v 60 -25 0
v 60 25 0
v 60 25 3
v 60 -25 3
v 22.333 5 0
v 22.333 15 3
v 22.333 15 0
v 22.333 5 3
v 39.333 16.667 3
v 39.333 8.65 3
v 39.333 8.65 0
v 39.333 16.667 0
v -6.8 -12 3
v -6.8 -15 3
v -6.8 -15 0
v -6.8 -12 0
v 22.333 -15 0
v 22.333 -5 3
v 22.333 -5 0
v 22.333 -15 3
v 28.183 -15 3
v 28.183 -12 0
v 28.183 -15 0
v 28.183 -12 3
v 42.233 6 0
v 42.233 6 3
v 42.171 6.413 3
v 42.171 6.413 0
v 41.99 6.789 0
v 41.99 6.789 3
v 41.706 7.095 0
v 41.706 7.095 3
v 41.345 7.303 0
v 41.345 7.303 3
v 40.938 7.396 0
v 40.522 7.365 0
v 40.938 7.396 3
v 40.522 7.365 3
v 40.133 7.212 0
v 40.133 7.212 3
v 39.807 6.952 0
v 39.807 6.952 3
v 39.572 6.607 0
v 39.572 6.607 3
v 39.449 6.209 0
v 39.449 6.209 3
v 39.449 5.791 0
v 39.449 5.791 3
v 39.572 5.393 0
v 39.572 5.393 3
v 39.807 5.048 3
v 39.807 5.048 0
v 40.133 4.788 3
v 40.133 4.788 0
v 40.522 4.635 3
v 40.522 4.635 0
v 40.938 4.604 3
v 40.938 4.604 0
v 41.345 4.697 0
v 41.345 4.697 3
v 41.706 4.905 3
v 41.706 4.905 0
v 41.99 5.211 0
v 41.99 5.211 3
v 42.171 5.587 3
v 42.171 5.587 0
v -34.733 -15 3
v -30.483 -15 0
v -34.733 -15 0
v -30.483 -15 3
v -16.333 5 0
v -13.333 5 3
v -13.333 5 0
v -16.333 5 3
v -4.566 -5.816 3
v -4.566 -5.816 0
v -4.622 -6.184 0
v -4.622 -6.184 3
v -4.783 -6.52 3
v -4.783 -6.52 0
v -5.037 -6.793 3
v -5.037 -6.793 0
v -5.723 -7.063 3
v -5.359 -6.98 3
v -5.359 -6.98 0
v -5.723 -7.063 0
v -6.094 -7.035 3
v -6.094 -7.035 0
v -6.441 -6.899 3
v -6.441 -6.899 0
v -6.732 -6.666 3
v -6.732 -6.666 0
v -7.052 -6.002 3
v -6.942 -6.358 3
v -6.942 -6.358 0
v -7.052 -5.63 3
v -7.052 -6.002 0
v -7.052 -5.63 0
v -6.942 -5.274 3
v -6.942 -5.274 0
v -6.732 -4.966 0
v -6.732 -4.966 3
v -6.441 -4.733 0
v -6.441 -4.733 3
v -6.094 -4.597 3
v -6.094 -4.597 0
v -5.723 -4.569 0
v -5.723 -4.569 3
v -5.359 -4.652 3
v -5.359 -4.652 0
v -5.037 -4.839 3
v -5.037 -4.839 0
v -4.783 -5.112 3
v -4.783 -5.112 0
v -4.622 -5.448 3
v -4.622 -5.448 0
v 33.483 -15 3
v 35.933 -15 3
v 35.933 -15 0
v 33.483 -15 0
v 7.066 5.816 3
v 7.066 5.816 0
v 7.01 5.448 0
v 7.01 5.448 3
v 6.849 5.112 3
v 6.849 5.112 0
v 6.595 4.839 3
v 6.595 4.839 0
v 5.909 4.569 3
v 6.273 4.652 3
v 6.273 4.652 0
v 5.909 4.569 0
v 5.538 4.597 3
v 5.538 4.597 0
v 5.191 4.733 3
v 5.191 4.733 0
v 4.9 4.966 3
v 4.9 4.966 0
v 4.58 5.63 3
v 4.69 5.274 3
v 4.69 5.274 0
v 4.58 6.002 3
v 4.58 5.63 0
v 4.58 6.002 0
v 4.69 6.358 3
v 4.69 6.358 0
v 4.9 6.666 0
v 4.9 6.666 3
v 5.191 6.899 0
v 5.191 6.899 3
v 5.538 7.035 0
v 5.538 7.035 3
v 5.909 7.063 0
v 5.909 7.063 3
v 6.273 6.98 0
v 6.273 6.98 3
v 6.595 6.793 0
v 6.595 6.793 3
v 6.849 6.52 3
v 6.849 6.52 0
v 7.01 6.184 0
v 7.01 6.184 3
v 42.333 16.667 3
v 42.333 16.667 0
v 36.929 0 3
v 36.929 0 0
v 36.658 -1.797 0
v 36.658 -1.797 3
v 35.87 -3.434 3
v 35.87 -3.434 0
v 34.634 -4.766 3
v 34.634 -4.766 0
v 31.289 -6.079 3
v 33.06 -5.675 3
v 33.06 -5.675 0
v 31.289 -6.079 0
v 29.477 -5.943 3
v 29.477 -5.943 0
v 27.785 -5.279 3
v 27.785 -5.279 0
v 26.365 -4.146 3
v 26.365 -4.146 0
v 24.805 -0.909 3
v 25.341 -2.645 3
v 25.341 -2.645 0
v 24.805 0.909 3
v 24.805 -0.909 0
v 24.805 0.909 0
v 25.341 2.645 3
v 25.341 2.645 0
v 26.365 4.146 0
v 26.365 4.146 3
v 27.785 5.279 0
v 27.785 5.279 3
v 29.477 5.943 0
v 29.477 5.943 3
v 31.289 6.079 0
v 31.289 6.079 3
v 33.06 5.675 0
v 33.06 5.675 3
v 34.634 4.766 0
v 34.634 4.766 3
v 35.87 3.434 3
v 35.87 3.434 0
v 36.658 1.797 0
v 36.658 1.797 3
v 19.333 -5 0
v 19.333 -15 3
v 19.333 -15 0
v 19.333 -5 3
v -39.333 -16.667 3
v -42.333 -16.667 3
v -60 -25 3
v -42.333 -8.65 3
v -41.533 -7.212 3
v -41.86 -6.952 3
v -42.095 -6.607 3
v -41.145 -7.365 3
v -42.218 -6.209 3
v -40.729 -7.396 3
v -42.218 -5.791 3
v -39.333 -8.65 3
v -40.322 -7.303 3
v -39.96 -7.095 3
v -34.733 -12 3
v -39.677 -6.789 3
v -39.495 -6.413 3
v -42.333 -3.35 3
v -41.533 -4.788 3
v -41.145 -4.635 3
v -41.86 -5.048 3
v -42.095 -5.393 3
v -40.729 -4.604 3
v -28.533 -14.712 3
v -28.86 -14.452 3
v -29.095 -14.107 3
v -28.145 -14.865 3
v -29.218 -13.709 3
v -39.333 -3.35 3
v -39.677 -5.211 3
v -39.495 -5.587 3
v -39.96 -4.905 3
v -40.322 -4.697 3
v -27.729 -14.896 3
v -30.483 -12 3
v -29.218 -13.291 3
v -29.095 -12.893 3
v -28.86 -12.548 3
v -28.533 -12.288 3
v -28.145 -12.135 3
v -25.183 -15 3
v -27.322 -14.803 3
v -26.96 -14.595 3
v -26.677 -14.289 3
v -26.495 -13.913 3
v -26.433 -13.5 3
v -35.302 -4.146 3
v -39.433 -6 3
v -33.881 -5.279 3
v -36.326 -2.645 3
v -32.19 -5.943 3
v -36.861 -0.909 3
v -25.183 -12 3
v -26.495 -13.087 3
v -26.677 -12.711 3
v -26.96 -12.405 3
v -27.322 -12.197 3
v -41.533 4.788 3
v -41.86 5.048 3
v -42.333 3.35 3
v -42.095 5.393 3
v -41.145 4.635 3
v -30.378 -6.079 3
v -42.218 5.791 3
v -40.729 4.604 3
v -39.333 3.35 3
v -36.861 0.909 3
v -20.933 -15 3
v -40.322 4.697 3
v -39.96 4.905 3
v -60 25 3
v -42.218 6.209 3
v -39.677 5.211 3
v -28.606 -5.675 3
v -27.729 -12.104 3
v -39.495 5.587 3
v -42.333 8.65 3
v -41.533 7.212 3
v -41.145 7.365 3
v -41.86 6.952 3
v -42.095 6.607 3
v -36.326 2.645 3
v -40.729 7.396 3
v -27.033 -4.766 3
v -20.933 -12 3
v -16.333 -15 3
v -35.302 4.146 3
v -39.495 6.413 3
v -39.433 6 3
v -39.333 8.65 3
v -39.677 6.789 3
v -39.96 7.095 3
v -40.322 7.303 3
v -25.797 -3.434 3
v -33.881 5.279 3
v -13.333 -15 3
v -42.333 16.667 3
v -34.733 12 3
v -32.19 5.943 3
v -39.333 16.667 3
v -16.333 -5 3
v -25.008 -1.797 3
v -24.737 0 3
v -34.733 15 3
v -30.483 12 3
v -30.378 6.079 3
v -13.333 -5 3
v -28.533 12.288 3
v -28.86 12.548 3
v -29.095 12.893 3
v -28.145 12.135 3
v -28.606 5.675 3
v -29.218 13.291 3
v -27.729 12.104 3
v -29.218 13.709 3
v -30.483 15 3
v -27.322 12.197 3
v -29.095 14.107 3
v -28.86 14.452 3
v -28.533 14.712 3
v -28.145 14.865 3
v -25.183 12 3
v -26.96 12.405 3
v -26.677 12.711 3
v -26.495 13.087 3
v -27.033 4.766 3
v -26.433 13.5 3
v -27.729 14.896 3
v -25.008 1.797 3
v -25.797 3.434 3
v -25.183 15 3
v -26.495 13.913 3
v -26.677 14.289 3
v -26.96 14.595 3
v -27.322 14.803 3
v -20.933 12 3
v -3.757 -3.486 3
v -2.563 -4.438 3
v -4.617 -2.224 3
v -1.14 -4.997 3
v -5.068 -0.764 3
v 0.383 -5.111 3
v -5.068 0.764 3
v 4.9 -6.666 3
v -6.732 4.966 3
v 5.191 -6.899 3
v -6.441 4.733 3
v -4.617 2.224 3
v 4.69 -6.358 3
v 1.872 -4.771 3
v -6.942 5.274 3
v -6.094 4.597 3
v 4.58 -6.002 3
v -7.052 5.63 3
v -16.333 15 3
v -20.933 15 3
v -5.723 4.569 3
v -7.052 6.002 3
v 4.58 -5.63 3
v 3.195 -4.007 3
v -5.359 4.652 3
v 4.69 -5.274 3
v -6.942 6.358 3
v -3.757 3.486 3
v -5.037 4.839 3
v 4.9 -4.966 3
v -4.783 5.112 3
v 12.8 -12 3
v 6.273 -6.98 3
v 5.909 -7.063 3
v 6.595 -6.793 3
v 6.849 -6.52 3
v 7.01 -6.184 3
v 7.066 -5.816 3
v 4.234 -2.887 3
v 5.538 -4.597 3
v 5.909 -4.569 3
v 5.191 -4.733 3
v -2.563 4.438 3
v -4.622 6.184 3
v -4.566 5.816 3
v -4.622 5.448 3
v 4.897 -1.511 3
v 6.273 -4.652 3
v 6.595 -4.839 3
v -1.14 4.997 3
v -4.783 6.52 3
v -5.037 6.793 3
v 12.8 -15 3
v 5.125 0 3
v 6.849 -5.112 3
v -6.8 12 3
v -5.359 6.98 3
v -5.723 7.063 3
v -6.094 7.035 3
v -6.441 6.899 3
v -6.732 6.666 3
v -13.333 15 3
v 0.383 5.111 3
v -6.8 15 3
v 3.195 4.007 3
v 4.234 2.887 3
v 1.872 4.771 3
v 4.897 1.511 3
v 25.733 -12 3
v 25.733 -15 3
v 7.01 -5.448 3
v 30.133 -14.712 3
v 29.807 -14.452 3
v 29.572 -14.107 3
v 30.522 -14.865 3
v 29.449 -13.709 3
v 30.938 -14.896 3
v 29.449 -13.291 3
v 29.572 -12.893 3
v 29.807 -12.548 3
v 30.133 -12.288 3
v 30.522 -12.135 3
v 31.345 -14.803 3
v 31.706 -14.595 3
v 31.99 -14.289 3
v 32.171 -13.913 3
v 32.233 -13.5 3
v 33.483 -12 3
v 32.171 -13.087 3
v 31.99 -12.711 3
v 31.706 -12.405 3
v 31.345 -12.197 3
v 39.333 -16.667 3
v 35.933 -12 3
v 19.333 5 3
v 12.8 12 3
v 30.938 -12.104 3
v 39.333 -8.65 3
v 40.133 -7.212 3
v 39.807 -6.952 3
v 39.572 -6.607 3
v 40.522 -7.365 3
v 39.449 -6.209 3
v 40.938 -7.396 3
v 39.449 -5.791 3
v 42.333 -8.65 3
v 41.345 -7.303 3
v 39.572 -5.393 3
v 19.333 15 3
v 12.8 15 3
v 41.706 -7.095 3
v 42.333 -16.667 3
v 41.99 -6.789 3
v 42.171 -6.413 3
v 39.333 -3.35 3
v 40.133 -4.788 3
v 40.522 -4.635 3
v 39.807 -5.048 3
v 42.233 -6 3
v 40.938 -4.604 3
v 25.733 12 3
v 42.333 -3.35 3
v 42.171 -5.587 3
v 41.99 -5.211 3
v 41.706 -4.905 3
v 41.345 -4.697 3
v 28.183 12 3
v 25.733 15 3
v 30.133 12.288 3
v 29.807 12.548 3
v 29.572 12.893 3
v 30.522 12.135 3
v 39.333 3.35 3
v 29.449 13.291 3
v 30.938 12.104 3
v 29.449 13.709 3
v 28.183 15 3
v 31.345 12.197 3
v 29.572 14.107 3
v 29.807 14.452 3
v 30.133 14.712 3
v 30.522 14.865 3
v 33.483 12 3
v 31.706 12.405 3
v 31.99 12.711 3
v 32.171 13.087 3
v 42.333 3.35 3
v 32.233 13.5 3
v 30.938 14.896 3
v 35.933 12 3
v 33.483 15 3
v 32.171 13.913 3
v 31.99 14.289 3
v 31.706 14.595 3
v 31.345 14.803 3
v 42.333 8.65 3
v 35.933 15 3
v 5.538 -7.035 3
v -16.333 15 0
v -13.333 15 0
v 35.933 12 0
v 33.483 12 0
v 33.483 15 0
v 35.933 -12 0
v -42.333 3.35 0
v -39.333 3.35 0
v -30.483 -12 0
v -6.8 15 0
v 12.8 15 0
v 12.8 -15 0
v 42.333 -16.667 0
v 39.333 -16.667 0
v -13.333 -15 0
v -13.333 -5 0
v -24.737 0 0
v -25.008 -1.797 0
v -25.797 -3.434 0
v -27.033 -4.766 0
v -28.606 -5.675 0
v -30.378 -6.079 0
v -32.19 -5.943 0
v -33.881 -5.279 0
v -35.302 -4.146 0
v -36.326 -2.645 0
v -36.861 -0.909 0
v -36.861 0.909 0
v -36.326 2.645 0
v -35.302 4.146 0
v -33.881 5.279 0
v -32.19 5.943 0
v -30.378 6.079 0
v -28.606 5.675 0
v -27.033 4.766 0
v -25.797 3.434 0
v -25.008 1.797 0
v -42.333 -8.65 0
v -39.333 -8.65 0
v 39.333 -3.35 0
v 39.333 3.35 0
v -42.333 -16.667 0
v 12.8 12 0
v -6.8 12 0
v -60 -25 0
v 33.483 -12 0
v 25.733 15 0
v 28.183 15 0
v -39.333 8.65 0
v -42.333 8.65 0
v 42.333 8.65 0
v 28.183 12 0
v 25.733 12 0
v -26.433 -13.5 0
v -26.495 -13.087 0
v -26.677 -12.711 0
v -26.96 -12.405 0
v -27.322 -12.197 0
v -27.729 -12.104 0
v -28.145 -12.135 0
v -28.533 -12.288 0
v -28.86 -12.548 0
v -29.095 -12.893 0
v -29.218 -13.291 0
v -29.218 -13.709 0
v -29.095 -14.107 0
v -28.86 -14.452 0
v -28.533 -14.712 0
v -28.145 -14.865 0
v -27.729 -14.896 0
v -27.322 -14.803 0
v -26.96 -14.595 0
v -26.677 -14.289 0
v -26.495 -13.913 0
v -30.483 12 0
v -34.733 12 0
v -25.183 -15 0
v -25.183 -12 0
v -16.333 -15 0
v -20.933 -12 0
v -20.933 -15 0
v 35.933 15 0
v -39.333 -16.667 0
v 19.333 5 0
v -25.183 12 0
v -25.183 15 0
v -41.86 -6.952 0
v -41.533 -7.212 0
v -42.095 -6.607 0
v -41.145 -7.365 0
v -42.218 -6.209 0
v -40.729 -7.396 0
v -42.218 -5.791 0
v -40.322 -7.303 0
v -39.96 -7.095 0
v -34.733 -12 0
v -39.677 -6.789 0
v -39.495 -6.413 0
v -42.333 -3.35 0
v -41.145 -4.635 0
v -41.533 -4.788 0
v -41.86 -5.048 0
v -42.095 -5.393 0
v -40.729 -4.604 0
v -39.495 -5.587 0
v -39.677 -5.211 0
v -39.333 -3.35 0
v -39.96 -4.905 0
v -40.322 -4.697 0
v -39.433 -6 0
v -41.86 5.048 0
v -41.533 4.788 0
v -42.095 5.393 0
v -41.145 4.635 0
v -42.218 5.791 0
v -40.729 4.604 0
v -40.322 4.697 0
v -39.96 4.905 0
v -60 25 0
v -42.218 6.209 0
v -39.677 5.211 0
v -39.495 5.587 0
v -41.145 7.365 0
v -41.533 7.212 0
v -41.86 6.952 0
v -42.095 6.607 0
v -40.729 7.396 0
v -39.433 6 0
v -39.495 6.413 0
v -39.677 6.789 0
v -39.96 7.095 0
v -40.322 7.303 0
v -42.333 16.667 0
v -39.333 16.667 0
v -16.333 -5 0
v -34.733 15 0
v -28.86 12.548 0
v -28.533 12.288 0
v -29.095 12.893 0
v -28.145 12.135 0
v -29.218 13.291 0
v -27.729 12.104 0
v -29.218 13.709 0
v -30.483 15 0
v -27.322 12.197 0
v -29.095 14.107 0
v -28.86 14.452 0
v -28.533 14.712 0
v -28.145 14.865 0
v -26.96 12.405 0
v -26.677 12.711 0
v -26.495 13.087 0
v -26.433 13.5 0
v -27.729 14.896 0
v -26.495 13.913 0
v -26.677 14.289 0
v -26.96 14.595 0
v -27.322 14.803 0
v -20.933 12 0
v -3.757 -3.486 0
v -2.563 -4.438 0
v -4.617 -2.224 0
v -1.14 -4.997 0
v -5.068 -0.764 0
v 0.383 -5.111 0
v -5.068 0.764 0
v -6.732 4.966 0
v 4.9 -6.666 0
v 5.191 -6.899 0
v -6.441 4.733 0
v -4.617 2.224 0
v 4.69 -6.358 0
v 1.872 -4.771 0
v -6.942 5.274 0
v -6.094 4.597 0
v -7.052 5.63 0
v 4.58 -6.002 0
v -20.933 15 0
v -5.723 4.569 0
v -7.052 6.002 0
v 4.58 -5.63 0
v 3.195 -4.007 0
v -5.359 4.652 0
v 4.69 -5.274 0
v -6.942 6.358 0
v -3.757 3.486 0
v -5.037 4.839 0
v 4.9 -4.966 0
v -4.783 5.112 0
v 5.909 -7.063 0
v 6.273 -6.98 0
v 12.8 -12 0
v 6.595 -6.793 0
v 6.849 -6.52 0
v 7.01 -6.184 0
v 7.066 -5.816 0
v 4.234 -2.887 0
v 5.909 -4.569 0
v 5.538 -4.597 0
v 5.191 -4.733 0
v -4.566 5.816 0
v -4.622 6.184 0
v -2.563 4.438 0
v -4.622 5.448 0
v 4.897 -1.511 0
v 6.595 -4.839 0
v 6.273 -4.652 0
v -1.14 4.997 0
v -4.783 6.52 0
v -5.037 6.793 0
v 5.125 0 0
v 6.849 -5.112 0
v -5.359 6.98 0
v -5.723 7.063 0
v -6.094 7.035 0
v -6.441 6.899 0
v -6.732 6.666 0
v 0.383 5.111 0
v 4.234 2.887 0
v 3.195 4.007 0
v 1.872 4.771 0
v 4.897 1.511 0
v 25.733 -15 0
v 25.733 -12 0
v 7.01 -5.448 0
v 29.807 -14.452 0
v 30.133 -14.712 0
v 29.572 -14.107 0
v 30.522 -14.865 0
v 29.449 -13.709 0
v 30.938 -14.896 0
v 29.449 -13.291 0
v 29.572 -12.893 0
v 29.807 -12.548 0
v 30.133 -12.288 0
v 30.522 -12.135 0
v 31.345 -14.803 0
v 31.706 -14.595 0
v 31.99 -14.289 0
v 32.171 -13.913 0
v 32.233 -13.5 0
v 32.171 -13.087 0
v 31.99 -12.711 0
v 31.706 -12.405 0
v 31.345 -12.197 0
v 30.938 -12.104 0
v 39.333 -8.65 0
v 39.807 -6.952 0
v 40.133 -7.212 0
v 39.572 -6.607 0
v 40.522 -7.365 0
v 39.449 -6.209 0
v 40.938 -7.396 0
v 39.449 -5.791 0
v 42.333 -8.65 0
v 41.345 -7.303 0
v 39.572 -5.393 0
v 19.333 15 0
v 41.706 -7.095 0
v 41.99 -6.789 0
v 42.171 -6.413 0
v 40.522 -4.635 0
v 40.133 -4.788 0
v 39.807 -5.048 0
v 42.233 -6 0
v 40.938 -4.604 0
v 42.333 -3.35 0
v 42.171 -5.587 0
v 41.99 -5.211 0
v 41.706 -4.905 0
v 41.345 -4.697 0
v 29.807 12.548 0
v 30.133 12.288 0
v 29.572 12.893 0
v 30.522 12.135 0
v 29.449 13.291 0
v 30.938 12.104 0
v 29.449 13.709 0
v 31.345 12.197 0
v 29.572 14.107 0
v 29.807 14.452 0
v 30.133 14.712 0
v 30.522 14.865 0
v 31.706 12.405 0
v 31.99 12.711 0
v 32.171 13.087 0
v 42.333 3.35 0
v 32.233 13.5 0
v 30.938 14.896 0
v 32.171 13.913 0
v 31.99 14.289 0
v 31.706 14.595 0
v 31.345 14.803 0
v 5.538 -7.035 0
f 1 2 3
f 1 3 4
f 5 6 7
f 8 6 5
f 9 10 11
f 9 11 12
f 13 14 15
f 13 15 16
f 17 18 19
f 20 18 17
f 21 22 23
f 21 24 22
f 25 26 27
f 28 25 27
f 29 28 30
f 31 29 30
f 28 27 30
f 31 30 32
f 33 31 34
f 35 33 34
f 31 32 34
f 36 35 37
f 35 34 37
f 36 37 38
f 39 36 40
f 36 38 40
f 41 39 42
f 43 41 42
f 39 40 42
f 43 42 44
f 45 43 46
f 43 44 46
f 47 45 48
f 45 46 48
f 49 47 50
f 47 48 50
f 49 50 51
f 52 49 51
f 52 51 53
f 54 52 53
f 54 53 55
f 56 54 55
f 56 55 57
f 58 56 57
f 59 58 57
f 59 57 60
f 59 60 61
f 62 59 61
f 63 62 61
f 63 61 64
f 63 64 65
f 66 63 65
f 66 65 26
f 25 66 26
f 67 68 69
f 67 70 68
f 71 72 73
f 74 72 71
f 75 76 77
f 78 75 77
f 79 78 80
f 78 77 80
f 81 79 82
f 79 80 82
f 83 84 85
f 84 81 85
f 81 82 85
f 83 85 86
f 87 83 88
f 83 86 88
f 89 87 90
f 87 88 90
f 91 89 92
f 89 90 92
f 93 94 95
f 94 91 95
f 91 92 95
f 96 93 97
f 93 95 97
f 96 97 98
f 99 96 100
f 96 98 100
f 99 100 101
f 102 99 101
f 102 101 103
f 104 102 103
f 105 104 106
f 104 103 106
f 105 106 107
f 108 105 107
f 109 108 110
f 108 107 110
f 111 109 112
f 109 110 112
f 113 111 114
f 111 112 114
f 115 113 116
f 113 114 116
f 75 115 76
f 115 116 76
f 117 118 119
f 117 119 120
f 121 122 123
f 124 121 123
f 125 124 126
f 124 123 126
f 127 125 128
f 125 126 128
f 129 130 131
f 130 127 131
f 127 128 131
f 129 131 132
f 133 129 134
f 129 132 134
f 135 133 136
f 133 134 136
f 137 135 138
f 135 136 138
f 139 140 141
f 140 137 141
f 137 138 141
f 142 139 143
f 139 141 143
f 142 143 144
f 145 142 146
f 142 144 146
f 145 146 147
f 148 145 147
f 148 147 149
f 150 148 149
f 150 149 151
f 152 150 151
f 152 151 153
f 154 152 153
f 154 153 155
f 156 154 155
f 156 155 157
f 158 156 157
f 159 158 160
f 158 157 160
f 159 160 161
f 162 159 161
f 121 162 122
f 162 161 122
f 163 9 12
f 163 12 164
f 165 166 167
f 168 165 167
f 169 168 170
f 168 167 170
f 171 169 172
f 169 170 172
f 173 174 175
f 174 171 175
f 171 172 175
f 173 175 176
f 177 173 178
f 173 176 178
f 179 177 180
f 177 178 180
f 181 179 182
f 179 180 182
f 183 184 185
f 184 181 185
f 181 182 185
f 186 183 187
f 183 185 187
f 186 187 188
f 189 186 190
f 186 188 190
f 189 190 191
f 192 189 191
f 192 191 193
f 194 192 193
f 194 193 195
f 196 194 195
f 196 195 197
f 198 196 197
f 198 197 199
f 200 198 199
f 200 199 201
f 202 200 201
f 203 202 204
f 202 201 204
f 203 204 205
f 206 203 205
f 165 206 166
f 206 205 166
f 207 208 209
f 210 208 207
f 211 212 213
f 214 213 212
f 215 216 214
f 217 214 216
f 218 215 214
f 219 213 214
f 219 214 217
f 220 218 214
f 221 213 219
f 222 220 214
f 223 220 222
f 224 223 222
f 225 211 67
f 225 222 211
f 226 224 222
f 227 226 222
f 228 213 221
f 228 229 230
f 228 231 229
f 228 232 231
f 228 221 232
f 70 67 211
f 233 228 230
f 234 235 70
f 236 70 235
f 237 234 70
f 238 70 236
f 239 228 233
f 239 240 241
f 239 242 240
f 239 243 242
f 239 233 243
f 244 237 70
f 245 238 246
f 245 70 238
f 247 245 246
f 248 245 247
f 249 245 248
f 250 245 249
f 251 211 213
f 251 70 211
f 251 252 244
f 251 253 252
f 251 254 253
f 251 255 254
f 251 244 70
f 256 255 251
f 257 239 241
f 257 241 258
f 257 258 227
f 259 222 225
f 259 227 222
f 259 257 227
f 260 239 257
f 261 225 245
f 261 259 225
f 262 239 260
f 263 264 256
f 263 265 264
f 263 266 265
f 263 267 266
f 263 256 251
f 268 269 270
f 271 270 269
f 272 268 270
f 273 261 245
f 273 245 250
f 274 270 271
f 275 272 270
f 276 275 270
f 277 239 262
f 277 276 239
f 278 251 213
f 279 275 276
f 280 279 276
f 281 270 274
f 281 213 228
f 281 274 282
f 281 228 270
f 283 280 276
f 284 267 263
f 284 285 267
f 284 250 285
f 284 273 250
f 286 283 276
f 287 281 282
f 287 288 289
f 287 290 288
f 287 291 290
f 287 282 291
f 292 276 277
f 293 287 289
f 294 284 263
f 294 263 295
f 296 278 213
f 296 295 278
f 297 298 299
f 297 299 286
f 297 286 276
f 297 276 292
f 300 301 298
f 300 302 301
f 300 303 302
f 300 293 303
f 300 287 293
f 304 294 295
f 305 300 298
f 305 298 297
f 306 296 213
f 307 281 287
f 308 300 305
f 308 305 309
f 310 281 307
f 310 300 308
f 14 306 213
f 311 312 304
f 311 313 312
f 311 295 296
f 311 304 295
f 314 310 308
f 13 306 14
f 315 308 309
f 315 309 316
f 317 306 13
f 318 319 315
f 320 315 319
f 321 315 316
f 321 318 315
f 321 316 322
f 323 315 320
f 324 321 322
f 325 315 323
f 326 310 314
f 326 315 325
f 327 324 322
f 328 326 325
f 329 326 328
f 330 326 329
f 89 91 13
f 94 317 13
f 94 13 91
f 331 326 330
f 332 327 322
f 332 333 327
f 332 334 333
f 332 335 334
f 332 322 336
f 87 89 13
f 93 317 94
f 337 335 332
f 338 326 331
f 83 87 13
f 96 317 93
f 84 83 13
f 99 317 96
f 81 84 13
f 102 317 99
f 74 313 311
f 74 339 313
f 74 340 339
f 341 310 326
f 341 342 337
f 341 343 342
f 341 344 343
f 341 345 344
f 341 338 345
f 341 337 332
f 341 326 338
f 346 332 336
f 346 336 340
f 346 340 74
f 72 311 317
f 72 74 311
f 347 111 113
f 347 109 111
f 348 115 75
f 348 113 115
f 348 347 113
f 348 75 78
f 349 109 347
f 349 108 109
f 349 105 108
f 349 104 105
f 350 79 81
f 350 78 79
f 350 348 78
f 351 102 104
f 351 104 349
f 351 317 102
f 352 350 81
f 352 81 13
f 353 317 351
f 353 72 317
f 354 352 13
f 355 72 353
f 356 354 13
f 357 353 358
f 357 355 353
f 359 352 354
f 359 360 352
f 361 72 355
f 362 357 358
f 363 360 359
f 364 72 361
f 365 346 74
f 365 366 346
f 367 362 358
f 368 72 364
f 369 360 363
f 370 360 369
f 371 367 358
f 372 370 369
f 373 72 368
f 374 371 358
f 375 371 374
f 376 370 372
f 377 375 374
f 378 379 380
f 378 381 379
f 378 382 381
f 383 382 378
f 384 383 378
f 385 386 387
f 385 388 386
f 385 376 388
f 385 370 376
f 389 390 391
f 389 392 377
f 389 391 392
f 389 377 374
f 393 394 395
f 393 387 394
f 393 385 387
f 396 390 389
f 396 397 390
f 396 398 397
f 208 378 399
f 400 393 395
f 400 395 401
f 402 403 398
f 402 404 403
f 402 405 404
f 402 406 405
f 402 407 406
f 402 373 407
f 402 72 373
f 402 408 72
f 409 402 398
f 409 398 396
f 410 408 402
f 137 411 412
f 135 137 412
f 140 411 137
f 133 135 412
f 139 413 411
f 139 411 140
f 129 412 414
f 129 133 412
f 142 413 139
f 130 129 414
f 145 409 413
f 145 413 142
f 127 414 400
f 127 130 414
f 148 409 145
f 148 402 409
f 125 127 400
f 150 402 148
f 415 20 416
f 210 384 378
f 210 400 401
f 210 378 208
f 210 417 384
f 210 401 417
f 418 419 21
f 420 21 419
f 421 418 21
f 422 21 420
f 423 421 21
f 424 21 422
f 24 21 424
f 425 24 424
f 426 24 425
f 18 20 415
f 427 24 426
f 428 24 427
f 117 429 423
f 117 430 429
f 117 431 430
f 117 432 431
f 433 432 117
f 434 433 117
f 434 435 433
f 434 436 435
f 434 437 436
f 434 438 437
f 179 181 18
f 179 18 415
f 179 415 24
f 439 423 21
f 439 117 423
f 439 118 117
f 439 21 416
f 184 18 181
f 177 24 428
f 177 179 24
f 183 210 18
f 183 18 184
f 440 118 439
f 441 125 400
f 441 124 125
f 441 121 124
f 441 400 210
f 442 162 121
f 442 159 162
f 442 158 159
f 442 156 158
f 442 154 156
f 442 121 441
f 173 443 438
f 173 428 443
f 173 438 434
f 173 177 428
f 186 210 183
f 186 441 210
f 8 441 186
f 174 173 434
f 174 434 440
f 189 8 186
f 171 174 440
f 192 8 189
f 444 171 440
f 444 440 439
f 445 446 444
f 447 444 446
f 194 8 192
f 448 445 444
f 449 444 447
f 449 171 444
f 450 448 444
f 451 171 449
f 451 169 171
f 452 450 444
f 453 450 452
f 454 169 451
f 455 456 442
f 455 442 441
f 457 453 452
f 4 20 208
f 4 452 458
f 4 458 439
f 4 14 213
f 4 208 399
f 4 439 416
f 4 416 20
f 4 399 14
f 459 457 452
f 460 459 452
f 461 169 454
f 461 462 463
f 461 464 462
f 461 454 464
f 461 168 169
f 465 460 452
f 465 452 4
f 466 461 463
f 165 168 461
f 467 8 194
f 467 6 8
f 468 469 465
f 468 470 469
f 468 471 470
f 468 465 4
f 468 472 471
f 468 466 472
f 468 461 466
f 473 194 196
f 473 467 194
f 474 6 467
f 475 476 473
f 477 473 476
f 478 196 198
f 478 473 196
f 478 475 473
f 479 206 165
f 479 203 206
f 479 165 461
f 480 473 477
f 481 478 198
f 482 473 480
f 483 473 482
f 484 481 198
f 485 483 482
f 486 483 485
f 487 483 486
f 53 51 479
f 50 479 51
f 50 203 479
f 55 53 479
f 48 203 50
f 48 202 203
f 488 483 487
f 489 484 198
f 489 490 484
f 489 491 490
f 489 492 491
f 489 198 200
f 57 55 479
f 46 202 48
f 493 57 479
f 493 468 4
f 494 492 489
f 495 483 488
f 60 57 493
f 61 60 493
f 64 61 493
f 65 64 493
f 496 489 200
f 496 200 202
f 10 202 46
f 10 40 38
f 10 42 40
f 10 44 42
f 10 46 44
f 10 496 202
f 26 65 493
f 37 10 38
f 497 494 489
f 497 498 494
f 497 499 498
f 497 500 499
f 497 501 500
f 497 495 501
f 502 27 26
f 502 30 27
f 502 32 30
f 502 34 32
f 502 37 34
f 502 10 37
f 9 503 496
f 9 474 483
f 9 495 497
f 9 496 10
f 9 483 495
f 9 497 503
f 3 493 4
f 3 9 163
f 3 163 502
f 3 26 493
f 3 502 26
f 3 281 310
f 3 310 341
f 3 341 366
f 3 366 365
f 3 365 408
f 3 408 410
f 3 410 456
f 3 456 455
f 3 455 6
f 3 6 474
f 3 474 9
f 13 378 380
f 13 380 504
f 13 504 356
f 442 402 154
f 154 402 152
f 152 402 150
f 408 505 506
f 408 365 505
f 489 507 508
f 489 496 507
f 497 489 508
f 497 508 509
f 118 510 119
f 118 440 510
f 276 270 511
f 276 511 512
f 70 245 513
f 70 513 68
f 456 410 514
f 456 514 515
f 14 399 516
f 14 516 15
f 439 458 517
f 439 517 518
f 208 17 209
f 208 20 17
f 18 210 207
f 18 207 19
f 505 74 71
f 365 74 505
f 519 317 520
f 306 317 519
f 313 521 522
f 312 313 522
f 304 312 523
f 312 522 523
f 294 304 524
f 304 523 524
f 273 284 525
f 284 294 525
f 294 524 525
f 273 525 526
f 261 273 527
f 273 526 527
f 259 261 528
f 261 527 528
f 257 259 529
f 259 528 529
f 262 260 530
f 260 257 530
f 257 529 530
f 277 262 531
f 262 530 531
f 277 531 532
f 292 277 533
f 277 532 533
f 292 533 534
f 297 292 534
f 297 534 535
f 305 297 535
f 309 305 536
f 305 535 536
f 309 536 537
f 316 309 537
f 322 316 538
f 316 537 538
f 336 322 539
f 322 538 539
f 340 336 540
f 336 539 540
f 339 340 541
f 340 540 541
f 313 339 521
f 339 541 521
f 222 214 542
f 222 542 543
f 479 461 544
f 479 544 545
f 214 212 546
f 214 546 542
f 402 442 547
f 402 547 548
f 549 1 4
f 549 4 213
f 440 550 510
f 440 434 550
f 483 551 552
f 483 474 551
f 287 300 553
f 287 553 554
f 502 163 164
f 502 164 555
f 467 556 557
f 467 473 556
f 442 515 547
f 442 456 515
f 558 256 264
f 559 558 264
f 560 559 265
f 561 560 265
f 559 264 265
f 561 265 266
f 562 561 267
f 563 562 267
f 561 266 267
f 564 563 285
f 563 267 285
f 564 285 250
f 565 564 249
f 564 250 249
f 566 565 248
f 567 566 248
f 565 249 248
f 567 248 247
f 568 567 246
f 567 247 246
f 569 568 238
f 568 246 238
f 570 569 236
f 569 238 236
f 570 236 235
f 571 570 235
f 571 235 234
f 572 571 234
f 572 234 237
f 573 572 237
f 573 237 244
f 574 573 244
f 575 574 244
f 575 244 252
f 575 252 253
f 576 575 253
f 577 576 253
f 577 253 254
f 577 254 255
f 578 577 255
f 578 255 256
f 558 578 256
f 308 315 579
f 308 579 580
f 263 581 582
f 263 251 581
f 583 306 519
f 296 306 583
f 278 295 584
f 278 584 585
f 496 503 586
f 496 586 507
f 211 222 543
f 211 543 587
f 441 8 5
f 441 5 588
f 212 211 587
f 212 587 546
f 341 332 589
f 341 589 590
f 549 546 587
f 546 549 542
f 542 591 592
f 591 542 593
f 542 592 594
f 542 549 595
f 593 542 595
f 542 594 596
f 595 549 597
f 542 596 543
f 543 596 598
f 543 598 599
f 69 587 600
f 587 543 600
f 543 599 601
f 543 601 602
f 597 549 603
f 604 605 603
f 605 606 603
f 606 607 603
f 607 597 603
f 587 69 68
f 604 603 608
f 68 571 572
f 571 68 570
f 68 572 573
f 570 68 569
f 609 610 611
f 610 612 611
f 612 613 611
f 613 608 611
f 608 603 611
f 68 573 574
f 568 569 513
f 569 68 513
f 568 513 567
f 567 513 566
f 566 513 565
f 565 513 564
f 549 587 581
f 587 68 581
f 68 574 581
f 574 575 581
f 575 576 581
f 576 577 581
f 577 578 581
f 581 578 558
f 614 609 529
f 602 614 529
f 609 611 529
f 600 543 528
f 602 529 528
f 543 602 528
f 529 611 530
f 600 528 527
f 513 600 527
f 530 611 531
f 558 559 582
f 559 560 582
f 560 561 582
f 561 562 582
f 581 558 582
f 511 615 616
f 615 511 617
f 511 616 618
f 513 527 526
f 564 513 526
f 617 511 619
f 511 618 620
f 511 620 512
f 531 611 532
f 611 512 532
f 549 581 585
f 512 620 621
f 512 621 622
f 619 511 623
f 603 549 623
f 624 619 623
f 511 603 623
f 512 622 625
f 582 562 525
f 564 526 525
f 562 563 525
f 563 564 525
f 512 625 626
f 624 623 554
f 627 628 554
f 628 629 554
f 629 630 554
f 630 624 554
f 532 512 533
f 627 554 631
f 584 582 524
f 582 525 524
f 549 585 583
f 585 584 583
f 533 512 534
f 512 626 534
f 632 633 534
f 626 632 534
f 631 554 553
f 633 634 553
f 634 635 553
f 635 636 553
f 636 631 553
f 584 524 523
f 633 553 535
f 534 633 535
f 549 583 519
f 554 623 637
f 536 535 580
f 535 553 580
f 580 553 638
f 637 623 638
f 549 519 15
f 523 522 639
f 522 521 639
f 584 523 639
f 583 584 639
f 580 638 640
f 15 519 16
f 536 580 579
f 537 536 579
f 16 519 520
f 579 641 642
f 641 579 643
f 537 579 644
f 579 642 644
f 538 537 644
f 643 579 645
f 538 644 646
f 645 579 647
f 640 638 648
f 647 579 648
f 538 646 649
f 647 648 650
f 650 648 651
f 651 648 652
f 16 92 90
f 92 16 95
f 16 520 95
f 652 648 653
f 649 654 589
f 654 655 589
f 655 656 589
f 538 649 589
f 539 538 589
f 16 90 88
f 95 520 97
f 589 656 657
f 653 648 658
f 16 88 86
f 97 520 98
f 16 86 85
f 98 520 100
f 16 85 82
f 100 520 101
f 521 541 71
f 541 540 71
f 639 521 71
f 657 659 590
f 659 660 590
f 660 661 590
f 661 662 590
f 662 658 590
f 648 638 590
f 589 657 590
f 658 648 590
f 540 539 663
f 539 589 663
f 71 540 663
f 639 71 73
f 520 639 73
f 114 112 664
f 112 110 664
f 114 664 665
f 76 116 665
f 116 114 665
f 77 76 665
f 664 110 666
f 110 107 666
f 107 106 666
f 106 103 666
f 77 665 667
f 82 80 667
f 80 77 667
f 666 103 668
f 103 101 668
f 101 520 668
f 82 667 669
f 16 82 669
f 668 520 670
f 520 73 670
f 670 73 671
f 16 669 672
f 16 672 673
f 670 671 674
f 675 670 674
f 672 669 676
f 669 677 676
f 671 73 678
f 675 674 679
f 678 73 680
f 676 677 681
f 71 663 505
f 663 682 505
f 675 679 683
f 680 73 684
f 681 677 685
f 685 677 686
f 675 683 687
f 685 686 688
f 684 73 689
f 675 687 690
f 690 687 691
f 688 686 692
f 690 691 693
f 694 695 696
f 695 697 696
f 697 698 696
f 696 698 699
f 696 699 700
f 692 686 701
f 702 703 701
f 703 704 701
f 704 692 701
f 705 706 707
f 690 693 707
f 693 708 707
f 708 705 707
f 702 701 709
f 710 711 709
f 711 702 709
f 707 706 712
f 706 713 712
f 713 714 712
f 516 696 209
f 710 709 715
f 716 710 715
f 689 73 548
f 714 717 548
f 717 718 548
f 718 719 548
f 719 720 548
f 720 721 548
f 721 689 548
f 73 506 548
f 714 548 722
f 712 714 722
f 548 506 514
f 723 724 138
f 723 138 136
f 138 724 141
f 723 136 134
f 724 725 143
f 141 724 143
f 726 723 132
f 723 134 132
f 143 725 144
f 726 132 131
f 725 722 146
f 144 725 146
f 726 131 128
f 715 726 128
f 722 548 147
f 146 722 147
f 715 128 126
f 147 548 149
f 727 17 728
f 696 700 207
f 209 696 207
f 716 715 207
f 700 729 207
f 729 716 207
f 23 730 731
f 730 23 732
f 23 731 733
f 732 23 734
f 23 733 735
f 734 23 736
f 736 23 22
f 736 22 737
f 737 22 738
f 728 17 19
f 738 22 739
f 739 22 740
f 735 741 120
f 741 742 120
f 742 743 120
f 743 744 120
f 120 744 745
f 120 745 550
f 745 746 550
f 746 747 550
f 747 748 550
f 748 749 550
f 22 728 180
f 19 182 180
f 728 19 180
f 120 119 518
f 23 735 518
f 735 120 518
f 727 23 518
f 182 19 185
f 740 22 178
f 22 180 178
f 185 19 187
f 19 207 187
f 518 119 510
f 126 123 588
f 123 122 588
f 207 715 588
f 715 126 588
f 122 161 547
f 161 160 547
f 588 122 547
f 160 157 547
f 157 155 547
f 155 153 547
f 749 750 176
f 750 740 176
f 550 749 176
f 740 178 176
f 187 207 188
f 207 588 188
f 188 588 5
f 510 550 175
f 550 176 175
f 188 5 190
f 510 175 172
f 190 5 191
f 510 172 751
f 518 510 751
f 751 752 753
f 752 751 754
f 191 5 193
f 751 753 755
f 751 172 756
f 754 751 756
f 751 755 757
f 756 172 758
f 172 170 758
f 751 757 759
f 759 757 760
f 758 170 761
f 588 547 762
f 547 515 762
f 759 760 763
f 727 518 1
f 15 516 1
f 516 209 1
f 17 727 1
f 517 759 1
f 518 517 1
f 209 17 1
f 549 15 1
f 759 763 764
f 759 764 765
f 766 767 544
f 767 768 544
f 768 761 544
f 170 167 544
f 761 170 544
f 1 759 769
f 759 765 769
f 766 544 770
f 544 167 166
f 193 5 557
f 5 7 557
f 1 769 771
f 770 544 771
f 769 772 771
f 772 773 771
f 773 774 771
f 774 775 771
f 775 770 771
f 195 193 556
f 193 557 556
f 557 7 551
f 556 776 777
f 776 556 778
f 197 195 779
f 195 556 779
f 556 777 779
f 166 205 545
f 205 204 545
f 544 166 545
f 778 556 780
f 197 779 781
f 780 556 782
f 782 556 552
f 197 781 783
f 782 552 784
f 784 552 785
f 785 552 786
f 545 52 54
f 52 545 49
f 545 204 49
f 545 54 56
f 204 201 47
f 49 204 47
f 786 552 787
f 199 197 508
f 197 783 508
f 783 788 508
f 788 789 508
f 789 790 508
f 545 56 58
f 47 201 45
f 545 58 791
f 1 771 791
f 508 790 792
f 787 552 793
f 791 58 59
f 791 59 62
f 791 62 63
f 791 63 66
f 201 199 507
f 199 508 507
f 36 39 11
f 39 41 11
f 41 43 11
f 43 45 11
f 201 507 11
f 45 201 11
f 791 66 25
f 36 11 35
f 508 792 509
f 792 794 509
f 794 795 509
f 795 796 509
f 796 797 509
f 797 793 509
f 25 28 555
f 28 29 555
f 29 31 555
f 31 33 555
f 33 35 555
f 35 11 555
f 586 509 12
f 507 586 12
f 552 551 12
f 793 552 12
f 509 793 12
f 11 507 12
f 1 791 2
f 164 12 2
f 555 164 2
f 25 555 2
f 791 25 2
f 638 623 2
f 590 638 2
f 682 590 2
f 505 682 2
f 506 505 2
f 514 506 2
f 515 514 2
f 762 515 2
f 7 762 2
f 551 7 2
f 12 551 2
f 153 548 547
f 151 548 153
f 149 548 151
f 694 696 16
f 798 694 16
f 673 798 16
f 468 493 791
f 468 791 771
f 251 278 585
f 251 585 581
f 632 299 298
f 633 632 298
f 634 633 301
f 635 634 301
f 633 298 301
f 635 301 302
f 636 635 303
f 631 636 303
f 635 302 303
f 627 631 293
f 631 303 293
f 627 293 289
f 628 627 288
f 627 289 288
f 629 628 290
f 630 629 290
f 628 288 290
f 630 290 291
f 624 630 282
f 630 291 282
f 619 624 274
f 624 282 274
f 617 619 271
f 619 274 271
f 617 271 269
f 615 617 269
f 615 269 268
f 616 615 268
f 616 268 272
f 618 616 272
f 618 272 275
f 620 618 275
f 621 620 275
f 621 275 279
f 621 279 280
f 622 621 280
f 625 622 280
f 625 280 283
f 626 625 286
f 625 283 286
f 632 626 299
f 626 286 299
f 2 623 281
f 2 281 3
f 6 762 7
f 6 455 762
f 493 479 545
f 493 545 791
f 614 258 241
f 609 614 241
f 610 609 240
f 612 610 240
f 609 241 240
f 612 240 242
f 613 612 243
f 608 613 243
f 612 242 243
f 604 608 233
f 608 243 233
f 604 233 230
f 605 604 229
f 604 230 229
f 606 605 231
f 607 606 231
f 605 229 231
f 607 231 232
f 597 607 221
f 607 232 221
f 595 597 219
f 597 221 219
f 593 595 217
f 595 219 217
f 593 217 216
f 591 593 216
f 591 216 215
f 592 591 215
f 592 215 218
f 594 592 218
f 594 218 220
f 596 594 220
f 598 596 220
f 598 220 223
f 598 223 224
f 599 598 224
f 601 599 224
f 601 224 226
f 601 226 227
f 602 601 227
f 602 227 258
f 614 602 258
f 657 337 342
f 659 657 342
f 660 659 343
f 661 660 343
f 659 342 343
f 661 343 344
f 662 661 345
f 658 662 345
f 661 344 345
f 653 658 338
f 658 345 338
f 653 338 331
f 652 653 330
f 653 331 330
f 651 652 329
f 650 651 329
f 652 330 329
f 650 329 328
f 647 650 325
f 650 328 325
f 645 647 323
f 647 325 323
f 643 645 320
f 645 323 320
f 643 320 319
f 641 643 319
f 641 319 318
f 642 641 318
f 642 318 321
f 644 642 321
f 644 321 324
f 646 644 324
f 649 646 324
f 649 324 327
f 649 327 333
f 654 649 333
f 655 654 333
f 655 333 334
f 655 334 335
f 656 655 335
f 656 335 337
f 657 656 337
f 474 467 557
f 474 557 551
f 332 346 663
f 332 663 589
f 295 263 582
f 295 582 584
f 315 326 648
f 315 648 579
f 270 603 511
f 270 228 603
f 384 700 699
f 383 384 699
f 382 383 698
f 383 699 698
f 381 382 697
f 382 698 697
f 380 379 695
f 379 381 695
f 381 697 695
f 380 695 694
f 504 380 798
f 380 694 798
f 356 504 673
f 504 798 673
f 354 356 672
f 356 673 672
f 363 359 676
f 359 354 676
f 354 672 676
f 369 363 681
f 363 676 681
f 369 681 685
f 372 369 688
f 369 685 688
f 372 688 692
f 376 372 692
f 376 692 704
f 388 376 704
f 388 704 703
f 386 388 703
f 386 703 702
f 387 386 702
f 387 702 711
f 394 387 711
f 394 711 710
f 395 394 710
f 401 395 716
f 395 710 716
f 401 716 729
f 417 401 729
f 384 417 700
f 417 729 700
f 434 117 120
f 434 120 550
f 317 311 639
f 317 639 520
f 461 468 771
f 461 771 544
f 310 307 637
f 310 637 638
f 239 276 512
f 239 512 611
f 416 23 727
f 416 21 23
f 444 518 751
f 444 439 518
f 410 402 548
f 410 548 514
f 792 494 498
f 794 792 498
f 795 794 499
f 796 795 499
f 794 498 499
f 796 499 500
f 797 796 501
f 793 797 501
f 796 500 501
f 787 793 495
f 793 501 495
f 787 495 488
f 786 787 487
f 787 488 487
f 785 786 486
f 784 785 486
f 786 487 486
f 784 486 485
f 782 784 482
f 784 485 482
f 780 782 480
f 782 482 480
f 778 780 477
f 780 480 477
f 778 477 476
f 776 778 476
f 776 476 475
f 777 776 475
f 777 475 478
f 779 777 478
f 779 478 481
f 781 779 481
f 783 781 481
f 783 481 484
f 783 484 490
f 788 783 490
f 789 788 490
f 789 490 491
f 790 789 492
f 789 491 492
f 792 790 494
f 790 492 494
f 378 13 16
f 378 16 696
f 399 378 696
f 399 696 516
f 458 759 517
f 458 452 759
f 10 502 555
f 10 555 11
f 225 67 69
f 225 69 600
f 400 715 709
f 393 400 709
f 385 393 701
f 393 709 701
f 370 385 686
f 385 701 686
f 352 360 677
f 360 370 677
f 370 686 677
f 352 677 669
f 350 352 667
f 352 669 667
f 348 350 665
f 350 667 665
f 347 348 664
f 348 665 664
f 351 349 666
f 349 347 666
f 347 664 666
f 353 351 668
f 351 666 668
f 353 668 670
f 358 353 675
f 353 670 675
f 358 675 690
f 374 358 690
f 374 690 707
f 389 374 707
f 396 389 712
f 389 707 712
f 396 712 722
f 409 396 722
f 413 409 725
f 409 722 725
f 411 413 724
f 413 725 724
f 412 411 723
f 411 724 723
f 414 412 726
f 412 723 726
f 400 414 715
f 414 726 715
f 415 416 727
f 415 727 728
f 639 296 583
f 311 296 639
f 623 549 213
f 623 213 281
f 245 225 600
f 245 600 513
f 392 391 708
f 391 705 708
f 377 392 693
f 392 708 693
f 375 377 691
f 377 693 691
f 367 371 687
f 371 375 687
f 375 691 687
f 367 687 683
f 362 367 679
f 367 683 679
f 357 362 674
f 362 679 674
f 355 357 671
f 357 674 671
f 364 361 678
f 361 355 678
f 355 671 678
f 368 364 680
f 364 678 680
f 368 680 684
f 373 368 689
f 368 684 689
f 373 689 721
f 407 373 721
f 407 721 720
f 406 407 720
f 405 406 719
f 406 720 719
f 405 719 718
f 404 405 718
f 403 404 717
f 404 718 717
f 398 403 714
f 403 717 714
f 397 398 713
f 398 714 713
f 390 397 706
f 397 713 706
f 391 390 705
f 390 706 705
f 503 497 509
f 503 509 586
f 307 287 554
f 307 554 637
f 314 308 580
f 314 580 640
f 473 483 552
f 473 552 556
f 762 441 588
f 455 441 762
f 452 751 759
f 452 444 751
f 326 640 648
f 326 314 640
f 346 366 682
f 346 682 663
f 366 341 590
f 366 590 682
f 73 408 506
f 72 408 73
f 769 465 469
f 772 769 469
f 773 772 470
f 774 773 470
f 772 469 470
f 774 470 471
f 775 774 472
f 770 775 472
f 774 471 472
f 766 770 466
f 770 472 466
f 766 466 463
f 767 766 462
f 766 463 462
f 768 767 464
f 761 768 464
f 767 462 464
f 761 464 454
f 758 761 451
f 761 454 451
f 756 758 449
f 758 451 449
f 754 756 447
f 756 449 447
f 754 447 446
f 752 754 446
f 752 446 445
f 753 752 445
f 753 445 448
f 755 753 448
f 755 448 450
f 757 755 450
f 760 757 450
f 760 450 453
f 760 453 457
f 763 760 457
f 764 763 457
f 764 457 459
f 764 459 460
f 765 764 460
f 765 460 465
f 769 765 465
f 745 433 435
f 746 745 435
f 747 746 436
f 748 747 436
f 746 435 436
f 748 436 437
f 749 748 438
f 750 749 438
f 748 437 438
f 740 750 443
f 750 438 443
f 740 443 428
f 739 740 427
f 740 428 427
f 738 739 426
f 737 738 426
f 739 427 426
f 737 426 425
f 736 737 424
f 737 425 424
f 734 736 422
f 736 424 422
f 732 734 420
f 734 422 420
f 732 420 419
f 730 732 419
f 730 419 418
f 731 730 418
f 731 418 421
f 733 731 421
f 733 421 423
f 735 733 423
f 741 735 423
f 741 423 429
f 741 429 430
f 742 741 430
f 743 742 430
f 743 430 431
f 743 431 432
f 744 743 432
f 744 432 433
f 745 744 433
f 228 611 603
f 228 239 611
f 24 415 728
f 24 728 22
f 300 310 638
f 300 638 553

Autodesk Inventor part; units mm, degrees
ref_plane "YZ Plane" through (0, 0, 0) normal (1, 0, 0) x (0, 1, 0)
ref_plane "XZ Plane" through (0, 0, 0) normal (0, 1, 0) x (-1, 0, 0)
ref_plane "XY Plane" through (0, 0, 0) normal (0, 0, 1) x (1, 0, 0)
sketch "Sketch1" plane through (0, 0, 0) normal (0, 0, 1) x (1, 0, 0)
  circle A0 centre (-5.816, 5.816) radius 1.25
  circle A1 centre (5.816, 5.816) radius 1.25
  circle A2 centre (5.816, -5.816) radius 1.25
  circle A3 centre (-5.816, -5.816) radius 1.25
  circle A4 centre (0, 0) radius 11
  circle A5 centre (0, 0) radius 5.125
  circle A6 centre (30.8333, 0) radius 6.096
  circle A7 centre (-30.8333, 0) radius 6.096
  line L0 (30.8333, 0) -> (-30.8333, 0) construction
  line L1 (-60, 25) -> (60, 25)
  line L2 (60, 25) -> (60, -25)
  line L3 (60, -25) -> (-60, -25)
  line L4 (-60, -25) -> (-60, 25)
  line L5 (0, 25) -> (0, -25) construction
  point P0 (0, 0)
  dimension "d9" = 2.5
  dimension "d10" = 2.5
  dimension "d11" = 2.5
  dimension "d12" = 2.5
  dimension "d33" = 120
  dimension "d34" = 50
extrude "Extrusion1" add sketch "Sketch1" along normal blind 3 contours A4 | L1 L2 L3 L4
sketch "Sketch2" plane through (0, 0, 3) normal (0, 0, 1) x (1, 0, 0)
  line L0 (42.3333, -16.6667) -> (39.3333, -16.6667)
  line L1 (39.3333, -16.6667) -> (39.3333, -8.65)
  line L2 (39.3333, -8.65) -> (42.3333, -8.65)
  line L3 (42.3333, -8.65) -> (42.3333, -16.6667)
  line L4 (39.3333, 3.35) -> (42.3333, 3.35)
  line L5 (42.3333, 3.35) -> (42.3333, -3.35)
  line L6 (42.3333, -3.35) -> (39.3333, -3.35)
  line L7 (39.3333, -3.35) -> (39.3333, 3.35)
  line L8 (42.3333, 8.65) -> (39.3333, 8.65)
  line L9 (39.3333, 8.65) -> (39.3333, 16.6667)
  line L10 (39.3333, 16.6667) -> (42.3333, 16.6667)
  line L11 (42.3333, 16.6667) -> (42.3333, 8.65)
  line L12 (-39.3333, -16.6667) -> (-42.3333, -16.6667)
  line L13 (-42.3333, -16.6667) -> (-42.3333, -8.65)
  line L14 (-42.3333, -8.65) -> (-39.3333, -8.65)
  line L15 (-39.3333, -8.65) -> (-39.3333, -16.6667)
  line L16 (-42.3333, 3.35) -> (-39.3333, 3.35)
  line L17 (-39.3333, 3.35) -> (-39.3333, -3.35)
  line L18 (-39.3333, -3.35) -> (-42.3333, -3.35)
  line L19 (-42.3333, -3.35) -> (-42.3333, 3.35)
  line L20 (-39.3333, 8.65) -> (-42.3333, 8.65)
  line L21 (-42.3333, 8.65) -> (-42.3333, 16.6667)
  line L22 (-42.3333, 16.6667) -> (-39.3333, 16.6667)
  line L23 (-39.3333, 16.6667) -> (-39.3333, 8.65)
  line L24 (19.3333, -5) -> (22.3333, -5)
  line L25 (22.3333, -5) -> (22.3333, -15)
  line L26 (22.3333, -15) -> (19.3333, -15)
  line L27 (19.3333, -15) -> (19.3333, -5)
  line L28 (22.3333, 5) -> (19.3333, 5)
  line L29 (19.3333, 5) -> (19.3333, 15)
  line L30 (19.3333, 15) -> (22.3333, 15)
  line L31 (22.3333, 15) -> (22.3333, 5)
  circle A0 centre (40.8333, 6) radius 1.4
  circle A1 centre (40.8333, -6) radius 1.4
  circle A2 centre (-40.8333, 6) radius 1.4
  circle A3 centre (-40.8333, -6) radius 1.4
  line L32 (33.4833, 12) -> (33.4833, 15)
  line L33 (33.4833, 15) -> (35.9333, 15)
  line L34 (35.9333, 15) -> (35.9333, 12)
  line L35 (35.9333, 12) -> (33.4833, 12)
  line L36 (28.1833, 15) -> (28.1833, 12)
  line L37 (28.1833, 12) -> (25.7333, 12)
  line L38 (25.7333, 12) -> (25.7333, 15)
  line L39 (25.7333, 15) -> (28.1833, 15)
  line L40 (-25.1833, 12) -> (-25.1833, 15)
  line L41 (-25.1833, 15) -> (-20.9333, 15)
  line L42 (-20.9333, 15) -> (-20.9333, 12)
  line L43 (-20.9333, 12) -> (-25.1833, 12)
  line L44 (-30.4833, 15) -> (-30.4833, 12)
  line L45 (-30.4833, 12) -> (-34.7333, 12)
  line L46 (-34.7333, 12) -> (-34.7333, 15)
  line L47 (-34.7333, 15) -> (-30.4833, 15)
  line L48 (12.8, 12) -> (-6.8, 12)
  line L49 (-6.8, 12) -> (-6.8, 15)
  line L50 (-6.8, 15) -> (12.8, 15)
  line L51 (12.8, 15) -> (12.8, 12)
  line L52 (-16.3333, -5) -> (-13.3333, -5)
  line L53 (-13.3333, -5) -> (-13.3333, -15)
  line L54 (-13.3333, -15) -> (-16.3333, -15)
  line L55 (-16.3333, -15) -> (-16.3333, -5)
  line L56 (-13.3333, 5) -> (-16.3333, 5)
  line L57 (-16.3333, 5) -> (-16.3333, 15)
  line L58 (-16.3333, 15) -> (-13.3333, 15)
  line L59 (-13.3333, 15) -> (-13.3333, 5)
  line L60 (-30.4833, -12) -> (-30.4833, -15)
  line L61 (-30.4833, -15) -> (-34.7333, -15)
  line L62 (-34.7333, -15) -> (-34.7333, -12)
  line L63 (-34.7333, -12) -> (-30.4833, -12)
  line L64 (-25.1833, -15) -> (-25.1833, -12)
  line L65 (-25.1833, -12) -> (-20.9333, -12)
  line L66 (-20.9333, -12) -> (-20.9333, -15)
  line L67 (-20.9333, -15) -> (-25.1833, -15)
  line L68 (28.1833, -12) -> (28.1833, -15)
  line L69 (28.1833, -15) -> (25.7333, -15)
  line L70 (25.7333, -15) -> (25.7333, -12)
  line L71 (25.7333, -12) -> (28.1833, -12)
  line L72 (33.4833, -15) -> (33.4833, -12)
  line L73 (33.4833, -12) -> (35.9333, -12)
  line L74 (35.9333, -12) -> (35.9333, -15)
  line L75 (35.9333, -15) -> (33.4833, -15)
  line L76 (-6.8, -12) -> (12.8, -12)
  line L77 (12.8, -12) -> (12.8, -15)
  line L78 (12.8, -15) -> (-6.8, -15)
  line L79 (-6.8, -15) -> (-6.8, -12)
  circle A4 centre (-27.8333, 13.5) radius 1.4
  circle A5 centre (-27.8333, -13.5) radius 1.4
  circle A6 centre (30.8333, -13.5) radius 1.4
  circle A7 centre (30.8333, 13.5) radius 1.4
  point P0 (0, 0)
  dimension "d35" = 2.8
  dimension "d36" = 2.8
  dimension "d37" = 5.3
  dimension "d38" = 2.65
  dimension "d39" = 2.65
  dimension "d40" = 2.8
  dimension "d41" = 2.8
  dimension "d42" = 2.65
  dimension "d43" = 2.65
  dimension "d44" = 2.8
  dimension "d45" = 5.3
  dimension "d46" = 2.65
  dimension "d47" = 2.8
  dimension "d48" = 2.8
  dimension "d49" = 5.3
  dimension "d50" = 2.65
  dimension "d51" = 2.8
extrude "Extrusion2" cut sketch "Sketch2" against normal blind 3
equation "\"d38\" = 0.5 * d37"
equation "\"d39\" = d38"
equation "\"d42\" = d38"
equation "\"d43\" = d42"
equation "\"d46\" = 0.5 * d45"
equation "\"d50\" = 0.5 * d49"
properties part number "Camera-Holder_Front"
